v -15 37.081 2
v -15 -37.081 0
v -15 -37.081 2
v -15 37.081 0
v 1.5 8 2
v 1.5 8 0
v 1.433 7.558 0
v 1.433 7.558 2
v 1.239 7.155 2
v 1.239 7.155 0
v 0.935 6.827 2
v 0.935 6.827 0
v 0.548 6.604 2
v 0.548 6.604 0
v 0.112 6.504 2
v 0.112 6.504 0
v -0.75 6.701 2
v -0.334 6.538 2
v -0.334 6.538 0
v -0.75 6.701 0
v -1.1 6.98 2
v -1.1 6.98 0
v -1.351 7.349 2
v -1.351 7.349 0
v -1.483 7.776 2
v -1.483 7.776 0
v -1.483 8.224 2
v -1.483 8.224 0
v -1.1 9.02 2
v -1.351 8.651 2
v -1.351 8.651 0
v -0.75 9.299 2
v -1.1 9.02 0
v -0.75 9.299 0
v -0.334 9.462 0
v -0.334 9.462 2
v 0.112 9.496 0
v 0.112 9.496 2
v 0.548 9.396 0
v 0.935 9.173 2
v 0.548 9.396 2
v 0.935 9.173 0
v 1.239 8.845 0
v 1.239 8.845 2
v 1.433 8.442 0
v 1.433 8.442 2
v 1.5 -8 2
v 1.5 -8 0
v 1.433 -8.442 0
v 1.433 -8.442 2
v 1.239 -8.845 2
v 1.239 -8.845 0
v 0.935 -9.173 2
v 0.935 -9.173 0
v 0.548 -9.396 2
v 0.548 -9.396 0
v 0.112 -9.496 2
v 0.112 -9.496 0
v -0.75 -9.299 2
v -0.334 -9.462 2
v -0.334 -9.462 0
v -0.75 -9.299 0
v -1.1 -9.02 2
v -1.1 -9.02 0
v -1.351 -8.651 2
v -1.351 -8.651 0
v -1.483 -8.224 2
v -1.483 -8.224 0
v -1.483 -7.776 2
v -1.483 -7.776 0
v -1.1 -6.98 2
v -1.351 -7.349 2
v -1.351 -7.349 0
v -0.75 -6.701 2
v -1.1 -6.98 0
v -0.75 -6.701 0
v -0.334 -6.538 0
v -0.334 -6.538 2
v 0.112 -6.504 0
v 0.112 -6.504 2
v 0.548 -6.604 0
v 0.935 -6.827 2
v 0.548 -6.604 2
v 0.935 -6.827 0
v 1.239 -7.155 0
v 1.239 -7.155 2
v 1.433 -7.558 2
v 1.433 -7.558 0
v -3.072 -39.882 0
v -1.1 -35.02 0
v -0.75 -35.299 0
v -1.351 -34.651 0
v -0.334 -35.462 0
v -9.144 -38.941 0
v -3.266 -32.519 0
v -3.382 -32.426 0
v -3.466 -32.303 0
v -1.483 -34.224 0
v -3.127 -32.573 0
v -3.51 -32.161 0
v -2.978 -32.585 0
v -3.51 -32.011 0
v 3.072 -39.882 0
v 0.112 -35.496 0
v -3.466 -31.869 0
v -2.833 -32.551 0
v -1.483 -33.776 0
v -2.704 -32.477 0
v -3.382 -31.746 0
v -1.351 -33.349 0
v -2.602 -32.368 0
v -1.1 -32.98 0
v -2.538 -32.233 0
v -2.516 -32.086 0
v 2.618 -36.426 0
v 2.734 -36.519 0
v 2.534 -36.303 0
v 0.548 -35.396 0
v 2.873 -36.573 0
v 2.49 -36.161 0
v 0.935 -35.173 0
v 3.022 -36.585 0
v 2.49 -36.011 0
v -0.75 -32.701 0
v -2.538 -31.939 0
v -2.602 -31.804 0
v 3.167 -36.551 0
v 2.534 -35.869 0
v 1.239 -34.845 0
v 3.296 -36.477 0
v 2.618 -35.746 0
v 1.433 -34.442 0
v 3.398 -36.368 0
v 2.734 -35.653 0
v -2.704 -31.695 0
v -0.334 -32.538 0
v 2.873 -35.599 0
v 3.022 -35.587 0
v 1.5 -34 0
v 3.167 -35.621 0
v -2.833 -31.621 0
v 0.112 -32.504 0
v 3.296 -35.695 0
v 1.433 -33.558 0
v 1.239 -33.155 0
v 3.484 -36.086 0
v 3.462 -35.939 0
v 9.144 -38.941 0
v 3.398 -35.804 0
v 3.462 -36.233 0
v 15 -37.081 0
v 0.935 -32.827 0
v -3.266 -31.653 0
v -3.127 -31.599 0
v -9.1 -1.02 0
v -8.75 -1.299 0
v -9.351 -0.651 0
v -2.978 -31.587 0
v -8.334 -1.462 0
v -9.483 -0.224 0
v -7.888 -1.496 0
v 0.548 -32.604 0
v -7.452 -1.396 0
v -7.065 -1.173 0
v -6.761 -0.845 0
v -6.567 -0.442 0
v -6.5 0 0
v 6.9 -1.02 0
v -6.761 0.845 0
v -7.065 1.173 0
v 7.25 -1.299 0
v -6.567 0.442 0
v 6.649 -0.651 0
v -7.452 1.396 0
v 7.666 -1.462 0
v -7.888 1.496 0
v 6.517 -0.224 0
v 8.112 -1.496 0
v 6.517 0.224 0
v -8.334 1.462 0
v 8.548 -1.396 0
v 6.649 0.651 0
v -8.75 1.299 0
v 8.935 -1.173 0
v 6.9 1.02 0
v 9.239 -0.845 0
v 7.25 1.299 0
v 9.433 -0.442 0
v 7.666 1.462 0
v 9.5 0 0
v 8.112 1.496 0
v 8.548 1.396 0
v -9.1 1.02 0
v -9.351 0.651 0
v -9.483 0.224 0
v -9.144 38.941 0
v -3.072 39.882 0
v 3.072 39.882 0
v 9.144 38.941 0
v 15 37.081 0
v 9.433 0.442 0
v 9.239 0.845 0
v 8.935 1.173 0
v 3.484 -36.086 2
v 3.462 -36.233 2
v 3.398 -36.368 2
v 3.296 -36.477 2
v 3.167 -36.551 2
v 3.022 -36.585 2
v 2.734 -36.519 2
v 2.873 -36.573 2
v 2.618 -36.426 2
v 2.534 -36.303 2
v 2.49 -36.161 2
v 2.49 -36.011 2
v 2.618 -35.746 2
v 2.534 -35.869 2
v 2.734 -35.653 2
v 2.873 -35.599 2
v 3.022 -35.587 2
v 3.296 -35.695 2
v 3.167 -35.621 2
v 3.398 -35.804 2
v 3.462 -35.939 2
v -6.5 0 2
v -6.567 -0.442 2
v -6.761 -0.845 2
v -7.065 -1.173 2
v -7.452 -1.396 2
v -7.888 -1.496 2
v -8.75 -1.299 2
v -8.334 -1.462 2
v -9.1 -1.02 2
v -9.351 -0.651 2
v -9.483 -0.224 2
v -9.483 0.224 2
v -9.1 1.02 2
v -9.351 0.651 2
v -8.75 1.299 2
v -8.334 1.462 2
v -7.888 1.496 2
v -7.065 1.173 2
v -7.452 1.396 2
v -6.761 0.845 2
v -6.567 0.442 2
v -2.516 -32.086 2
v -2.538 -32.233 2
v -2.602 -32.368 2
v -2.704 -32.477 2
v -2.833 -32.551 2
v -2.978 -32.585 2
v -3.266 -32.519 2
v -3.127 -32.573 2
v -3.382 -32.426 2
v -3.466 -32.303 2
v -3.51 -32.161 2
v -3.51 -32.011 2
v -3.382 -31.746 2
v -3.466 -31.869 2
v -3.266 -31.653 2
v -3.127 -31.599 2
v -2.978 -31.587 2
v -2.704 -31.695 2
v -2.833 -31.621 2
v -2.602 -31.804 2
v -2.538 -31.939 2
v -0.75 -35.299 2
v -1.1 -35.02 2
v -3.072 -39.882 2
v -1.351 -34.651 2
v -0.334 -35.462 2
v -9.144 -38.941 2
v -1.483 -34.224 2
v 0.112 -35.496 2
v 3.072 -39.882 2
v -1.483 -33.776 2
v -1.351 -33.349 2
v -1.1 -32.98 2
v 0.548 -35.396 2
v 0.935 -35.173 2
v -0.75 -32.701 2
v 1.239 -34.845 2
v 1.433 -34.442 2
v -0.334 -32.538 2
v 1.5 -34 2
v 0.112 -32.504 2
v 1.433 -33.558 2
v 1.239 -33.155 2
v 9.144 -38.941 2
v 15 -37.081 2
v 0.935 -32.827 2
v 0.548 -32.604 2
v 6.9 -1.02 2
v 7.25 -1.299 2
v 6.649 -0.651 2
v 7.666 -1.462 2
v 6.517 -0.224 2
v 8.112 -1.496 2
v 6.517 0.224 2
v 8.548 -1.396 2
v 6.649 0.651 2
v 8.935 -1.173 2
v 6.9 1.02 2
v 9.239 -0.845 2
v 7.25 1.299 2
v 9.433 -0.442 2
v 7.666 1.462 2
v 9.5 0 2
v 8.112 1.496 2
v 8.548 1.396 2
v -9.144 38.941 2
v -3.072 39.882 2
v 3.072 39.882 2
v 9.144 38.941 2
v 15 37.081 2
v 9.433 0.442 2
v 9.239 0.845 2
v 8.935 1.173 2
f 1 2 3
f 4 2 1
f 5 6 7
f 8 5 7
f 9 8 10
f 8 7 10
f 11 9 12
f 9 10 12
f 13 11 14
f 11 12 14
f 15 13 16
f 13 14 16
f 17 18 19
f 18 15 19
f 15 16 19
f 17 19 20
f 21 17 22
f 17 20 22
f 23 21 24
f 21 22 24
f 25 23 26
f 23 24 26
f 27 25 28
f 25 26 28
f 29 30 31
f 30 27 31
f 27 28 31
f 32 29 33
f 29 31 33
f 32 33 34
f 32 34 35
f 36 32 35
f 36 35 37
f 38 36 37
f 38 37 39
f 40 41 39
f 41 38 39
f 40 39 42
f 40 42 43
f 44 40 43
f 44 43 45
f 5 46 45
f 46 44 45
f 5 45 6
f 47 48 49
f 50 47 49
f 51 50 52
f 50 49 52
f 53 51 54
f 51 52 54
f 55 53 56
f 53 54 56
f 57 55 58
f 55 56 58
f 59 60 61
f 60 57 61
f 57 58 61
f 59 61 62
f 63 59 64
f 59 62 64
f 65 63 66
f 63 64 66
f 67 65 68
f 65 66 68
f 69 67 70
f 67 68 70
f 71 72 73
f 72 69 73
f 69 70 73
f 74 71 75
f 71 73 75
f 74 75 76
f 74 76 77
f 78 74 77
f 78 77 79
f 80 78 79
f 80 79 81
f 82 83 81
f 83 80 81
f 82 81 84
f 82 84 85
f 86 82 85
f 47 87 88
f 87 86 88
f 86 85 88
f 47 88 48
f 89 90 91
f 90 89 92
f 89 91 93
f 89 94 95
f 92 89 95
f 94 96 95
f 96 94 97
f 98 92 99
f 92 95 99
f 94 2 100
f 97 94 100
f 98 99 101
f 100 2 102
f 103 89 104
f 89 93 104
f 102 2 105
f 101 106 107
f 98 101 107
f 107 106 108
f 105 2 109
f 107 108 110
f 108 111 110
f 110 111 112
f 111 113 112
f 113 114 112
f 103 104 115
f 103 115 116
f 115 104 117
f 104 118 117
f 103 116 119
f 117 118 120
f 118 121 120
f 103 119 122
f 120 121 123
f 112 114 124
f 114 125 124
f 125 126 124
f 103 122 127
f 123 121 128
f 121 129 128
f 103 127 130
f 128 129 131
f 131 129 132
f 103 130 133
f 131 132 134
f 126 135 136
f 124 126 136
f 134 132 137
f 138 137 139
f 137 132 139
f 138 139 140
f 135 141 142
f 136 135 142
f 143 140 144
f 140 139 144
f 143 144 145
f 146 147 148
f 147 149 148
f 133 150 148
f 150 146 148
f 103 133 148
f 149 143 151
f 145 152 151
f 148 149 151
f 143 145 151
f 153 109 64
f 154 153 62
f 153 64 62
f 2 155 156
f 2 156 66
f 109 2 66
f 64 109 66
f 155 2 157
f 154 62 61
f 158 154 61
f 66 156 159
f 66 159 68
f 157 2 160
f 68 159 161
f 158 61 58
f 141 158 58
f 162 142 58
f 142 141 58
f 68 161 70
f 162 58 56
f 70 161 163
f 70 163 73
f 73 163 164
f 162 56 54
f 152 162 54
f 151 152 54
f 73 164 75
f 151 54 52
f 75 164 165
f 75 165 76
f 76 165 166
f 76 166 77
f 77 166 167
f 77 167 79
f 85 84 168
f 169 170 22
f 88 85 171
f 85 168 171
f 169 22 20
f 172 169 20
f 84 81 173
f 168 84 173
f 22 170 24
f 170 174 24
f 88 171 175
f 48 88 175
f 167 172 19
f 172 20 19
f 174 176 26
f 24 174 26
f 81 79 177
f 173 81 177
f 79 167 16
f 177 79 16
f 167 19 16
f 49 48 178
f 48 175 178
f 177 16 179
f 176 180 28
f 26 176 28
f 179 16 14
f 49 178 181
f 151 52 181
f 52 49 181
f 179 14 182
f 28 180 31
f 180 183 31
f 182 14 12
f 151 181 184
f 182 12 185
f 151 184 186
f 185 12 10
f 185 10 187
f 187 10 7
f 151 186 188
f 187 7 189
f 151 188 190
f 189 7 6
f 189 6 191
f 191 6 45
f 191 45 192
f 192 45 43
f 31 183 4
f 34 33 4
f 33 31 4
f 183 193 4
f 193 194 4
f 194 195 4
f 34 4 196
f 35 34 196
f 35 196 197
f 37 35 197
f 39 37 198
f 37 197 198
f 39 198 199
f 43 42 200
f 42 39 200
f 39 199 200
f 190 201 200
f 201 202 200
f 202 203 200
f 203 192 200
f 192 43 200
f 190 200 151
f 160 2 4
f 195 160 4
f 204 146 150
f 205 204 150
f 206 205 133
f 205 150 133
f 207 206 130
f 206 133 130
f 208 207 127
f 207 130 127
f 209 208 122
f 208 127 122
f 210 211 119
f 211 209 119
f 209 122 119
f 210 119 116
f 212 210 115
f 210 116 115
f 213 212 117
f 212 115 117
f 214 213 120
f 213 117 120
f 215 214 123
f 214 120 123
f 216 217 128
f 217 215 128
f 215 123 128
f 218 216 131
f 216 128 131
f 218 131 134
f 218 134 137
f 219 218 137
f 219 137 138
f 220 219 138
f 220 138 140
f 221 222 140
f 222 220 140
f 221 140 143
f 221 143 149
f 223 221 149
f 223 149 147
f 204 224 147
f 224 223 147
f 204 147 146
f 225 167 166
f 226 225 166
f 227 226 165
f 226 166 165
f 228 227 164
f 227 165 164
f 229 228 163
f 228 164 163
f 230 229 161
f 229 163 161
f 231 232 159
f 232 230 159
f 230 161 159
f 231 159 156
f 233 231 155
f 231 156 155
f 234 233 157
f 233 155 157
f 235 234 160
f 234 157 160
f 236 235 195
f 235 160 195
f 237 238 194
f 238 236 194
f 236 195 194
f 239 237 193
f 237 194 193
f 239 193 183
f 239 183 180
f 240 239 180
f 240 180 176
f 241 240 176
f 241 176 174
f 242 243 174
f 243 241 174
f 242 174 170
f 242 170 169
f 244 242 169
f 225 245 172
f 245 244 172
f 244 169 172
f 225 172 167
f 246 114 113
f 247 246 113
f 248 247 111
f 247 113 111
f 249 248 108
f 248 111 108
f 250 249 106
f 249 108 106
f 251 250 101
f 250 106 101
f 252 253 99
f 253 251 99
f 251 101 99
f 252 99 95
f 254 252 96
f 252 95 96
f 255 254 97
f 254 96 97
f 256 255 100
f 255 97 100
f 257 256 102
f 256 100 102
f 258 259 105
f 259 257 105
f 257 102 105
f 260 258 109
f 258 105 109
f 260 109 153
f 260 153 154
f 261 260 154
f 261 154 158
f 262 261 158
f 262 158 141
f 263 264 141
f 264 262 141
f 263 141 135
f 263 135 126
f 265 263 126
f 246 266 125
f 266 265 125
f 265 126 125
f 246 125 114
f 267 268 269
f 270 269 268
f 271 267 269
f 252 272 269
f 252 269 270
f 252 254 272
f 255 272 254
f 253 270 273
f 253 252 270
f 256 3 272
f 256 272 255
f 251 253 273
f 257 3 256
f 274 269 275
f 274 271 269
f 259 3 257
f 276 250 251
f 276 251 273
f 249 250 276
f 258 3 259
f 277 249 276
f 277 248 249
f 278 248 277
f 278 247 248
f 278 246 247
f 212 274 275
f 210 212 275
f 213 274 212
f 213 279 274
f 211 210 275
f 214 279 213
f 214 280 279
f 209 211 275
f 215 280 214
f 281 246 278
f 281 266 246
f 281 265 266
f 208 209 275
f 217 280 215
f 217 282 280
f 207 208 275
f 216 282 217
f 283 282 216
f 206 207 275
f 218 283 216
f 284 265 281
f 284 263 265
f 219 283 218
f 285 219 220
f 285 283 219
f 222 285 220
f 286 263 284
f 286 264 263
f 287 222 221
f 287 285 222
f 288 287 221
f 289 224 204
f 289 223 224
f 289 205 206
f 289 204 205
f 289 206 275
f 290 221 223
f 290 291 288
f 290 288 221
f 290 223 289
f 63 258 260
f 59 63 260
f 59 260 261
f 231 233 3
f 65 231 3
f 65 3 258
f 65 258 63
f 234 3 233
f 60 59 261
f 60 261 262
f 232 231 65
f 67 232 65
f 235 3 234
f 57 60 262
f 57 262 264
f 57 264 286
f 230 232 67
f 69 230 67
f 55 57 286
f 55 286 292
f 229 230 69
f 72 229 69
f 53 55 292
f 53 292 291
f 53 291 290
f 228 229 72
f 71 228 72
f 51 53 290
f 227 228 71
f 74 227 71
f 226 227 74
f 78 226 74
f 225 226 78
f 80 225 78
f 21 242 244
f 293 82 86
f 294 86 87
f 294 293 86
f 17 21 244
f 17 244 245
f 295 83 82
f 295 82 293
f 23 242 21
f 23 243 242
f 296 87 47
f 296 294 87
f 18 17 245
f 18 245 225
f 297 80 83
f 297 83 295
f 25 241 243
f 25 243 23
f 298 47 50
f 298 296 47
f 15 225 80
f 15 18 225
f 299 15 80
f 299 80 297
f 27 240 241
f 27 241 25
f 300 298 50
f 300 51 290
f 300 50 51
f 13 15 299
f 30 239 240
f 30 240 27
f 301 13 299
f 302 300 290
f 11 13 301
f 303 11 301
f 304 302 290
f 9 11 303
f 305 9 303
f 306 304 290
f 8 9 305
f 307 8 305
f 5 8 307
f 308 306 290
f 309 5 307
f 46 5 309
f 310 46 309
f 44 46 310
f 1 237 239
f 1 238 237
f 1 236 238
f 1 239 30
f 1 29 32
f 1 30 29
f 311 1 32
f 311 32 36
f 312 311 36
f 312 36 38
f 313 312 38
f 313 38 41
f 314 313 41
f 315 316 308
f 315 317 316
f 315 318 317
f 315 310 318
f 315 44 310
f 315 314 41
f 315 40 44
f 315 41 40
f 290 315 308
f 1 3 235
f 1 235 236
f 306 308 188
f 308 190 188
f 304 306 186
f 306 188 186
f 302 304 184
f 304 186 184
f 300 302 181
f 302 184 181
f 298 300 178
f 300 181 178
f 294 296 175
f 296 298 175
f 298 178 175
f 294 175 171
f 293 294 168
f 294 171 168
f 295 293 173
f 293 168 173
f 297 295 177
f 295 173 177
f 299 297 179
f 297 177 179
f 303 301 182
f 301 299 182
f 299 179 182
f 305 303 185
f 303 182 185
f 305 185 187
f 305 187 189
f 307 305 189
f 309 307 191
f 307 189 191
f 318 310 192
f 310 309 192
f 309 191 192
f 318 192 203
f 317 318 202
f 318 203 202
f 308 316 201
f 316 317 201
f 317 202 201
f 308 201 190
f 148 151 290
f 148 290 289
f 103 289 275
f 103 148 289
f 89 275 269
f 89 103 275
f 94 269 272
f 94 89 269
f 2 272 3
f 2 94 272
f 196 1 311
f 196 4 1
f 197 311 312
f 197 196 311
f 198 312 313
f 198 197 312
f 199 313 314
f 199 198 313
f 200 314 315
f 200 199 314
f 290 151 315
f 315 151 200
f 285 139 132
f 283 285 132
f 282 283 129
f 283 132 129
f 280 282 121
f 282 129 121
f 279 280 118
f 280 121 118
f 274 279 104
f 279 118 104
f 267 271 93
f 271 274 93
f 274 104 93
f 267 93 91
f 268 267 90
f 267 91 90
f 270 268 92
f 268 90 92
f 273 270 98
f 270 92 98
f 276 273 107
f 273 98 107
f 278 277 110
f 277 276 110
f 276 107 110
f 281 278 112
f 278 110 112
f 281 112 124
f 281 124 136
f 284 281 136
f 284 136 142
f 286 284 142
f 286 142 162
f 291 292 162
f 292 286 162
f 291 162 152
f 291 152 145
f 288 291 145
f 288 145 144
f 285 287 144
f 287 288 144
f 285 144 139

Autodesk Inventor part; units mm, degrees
ref_plane "YZ Plane" through (0, 0, 0) normal (1, 0, 0) x (0, 1, 0)
ref_plane "XZ Plane" through (0, 0, 0) normal (0, 1, 0) x (-1, 0, 0)
ref_plane "XY Plane" through (0, 0, 0) normal (0, 0, 1) x (1, 0, 0)
sketch "Sketch1" plane through (0, 0, 0) normal (0, 0, 1) x (1, 0, 0)
  circle A0 centre (0, 0) radius 40
  circle A1 centre (0, -8) radius 1.5
  circle A2 centre (8, 0) radius 1.5
  circle A3 centre (0, 8) radius 1.5
  circle A4 centre (-8, 0) radius 1.5
  circle A5 centre (0, -34) radius 1.5
  circle A6 centre (-3.0155, -32.086) radius 0.5 projected
  circle A7 centre (2.9845, -36.086) radius 0.5 projected
  line L0 (-15, -37.081) -> (-15, 37.081)
  line L1 (15, -37.081) -> (15, 37.081)
  dimension "d0" = 80
  dimension "d1" = 8
  dimension "d2" = 3
  dimension "d5" = 360
  dimension "d9" = 3
  dimension "d10" = 34
  dimension "d11" = 15
  dimension "d12" = 15
extrude "Extrusion1" add sketch "Sketch1" along normal blind 2 contours L1 A0 L0
equation "\"d12\" = d11"
properties part number "z roto base" material "Steel, Mild"
